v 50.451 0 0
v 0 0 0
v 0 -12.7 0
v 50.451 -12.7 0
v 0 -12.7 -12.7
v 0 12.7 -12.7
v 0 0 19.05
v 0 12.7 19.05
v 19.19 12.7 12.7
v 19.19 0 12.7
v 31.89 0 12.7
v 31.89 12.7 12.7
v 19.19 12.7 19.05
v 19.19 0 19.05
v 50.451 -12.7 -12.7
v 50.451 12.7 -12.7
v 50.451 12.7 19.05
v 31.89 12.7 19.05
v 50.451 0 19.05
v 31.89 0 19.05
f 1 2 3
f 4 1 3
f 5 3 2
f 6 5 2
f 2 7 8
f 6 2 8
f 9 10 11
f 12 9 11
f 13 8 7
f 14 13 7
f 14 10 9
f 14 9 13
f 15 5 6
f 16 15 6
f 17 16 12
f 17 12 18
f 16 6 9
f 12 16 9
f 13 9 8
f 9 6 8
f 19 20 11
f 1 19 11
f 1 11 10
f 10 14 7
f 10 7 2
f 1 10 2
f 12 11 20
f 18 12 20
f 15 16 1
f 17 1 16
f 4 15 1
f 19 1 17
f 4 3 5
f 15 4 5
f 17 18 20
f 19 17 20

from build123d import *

# Parameters (mm, degrees)
F1_DEPTH = 25.4
F2_DEPTH = 38.1
F3_W     = 12.7
F3_H     = 6.35
F4_DEPTH = 12.7
F5_W     = 13.048822
F5_H     = 19.05
F6_DEPTH = 25.4
F7_W     = 13.048822
F7_H     = 12.7
F8_DEPTH = 25.4


with BuildPart() as f1:
    # F0 (on Right) → F1 (new body)
    with BuildSketch(Plane.YZ):
        Polygon((-12.7, 0), (-12.7, -12.7), (12.7, -12.7), (12.7, 19.05), (0, 19.05), (0, 0), align=None)
    extrude(amount=F1_DEPTH)

    # F1_face (on face) → F2 (join)
    with BuildSketch(Plane(origin=(25.4, 2.721429, 0.453571), x_dir=(0, 1, 0), z_dir=(1, 0, 0))):
        Polygon((-15.421429, -0.453571), (-15.421429, -13.153571), (9.978571, -13.153571), (9.978571, 18.596429), (-2.721429, 18.596429), (-2.721429, -0.453571), align=None)
    extrude(amount=F2_DEPTH)

    # F3 (on face) → F4 (cut)
    with BuildSketch(Plane.XZ):
        with Locations((25.540019, 15.875)):
            Rectangle(F3_W, F3_H)
    extrude(amount=-F4_DEPTH, mode=Mode.SUBTRACT)

    # F5 (on face) → F6 (cut)
    with BuildSketch(Plane.XZ):
        with Locations((56.975589, 9.525)):
            Rectangle(F5_W, F5_H)
    extrude(amount=-F6_DEPTH, mode=Mode.SUBTRACT)

    # F7 (on face) → F8 (cut)
    with BuildSketch(Plane.XZ.offset(12.7)):
        with Locations((56.975589, -6.35)):
            Rectangle(F7_W, F7_H)
    extrude(amount=-F8_DEPTH, mode=Mode.SUBTRACT)


solid = f1.part
